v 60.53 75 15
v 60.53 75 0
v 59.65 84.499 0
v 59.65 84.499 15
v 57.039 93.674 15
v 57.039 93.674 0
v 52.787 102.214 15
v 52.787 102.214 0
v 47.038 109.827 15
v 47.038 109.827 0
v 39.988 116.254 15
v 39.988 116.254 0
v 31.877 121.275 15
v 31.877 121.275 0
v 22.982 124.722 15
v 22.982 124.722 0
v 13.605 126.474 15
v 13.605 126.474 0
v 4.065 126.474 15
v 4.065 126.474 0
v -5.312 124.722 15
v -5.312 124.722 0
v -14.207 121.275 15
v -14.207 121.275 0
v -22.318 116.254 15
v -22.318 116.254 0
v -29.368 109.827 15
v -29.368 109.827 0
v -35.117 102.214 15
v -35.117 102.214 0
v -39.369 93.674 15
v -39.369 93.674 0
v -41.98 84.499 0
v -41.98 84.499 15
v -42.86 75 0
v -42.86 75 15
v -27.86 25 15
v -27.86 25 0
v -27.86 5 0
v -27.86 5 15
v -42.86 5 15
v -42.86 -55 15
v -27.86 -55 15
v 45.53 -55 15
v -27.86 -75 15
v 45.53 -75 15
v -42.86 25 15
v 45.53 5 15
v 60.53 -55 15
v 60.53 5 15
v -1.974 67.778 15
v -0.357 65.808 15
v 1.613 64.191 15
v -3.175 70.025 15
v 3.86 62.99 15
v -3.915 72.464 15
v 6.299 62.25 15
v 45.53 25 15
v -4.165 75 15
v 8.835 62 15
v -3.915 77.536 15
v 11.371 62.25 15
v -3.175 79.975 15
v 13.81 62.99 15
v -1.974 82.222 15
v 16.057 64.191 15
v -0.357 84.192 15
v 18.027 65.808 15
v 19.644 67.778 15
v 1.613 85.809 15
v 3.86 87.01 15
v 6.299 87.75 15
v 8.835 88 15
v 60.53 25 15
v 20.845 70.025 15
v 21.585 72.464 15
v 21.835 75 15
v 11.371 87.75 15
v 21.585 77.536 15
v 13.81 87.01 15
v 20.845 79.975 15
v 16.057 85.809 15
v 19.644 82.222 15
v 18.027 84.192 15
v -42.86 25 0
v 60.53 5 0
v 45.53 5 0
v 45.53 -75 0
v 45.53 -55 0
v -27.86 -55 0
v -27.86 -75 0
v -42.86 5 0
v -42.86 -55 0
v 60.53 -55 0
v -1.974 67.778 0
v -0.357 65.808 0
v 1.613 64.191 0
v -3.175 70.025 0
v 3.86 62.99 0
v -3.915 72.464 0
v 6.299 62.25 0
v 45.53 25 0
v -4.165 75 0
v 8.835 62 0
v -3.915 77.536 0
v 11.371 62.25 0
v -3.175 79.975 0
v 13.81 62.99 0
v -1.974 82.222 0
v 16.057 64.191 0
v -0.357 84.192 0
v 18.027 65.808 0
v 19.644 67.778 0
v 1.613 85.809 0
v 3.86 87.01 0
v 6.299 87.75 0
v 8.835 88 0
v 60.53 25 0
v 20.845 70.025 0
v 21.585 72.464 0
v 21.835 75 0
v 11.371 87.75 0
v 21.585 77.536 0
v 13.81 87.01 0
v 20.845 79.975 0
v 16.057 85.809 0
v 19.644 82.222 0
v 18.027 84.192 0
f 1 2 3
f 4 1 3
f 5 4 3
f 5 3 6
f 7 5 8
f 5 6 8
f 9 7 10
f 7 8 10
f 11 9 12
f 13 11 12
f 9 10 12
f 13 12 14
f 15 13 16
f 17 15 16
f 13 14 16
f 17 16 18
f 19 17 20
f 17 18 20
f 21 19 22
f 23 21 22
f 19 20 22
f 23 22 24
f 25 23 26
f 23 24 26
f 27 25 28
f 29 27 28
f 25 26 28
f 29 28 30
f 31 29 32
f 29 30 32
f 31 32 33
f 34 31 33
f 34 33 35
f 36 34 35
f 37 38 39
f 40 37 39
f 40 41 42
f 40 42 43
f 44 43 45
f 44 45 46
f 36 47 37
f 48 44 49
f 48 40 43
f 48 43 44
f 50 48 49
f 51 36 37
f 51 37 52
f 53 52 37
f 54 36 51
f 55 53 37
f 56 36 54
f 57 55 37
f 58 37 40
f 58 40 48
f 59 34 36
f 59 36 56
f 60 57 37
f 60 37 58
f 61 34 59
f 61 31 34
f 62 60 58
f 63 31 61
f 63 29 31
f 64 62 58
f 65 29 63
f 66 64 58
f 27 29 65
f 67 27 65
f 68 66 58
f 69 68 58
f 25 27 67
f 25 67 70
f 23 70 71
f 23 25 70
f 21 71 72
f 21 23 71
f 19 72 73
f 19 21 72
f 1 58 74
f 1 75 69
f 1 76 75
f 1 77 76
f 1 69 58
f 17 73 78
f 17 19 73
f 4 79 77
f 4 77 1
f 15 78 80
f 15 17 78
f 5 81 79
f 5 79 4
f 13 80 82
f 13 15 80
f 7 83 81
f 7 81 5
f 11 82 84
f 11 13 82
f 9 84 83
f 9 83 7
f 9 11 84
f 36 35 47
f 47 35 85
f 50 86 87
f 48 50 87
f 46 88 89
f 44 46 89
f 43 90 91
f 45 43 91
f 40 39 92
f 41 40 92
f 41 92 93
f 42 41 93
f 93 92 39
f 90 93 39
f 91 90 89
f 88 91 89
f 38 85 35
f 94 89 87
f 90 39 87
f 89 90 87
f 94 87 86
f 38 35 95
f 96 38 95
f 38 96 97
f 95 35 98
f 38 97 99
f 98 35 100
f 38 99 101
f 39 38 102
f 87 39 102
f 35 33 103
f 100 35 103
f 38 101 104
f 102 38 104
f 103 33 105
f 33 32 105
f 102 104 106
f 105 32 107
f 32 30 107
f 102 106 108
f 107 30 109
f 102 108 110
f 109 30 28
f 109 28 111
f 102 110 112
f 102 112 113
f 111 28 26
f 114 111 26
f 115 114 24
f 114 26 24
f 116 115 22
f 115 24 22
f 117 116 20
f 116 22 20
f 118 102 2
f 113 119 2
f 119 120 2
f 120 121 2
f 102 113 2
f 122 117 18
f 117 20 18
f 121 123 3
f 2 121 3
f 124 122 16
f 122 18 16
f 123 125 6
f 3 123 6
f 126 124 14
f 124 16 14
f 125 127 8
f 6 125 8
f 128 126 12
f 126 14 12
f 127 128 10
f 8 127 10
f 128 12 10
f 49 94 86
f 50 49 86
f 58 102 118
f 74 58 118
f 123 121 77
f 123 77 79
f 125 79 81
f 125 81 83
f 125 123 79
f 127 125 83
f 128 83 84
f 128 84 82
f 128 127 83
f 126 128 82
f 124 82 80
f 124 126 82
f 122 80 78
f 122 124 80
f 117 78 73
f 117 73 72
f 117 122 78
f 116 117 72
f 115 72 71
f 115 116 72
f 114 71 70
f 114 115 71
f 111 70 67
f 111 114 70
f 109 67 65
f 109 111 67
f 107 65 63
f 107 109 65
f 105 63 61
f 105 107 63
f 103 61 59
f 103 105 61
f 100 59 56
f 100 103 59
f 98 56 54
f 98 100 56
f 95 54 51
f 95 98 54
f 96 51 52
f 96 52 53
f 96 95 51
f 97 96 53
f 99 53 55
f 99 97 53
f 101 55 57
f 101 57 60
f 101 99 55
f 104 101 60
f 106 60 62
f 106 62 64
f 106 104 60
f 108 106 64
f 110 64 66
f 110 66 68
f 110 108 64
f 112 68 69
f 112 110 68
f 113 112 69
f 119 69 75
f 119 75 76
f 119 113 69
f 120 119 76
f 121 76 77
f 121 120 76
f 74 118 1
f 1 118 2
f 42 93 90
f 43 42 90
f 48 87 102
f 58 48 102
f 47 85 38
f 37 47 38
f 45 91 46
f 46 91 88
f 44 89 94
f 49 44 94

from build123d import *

# Parameters (mm, degrees)
ESQUISSE1_R        = 13
BOSS_EXTRU_1_DEPTH = 15


with BuildPart() as part:
    # Esquisse1 → Boss.-Extru.1 (new body)
    with BuildSketch(Plane.XY):
        with BuildLine():
            Line((-27.86, -55), (-27.86, -75))
            Line((-27.86, -75), (45.53, -75))
            Line((45.53, -75), (45.53, -55))
            Line((45.53, -55), (60.53, -55))
            Line((60.53, -55), (60.53, 5))
            Line((60.53, 5), (45.53, 5))
            Line((45.53, 5), (45.53, 25))
            Line((45.53, 25), (60.53, 25))
            Line((60.53, 25), (60.53, 75))
            ThreePointArc((60.53, 75), (8.835, 126.695), (-42.86, 75))
            Line((-42.86, 75), (-42.86, 25))
            Line((-42.86, 25), (-27.86, 25))
            Line((-27.86, 25), (-27.86, 5))
            Line((-27.86, 5), (-42.86, 5))
            Line((-42.86, 5), (-42.86, -55))
            Line((-42.86, -55), (-27.86, -55))
        make_face()
        with Locations((8.835, 75)):
            Circle(ESQUISSE1_R, mode=Mode.SUBTRACT)
    extrude(amount=BOSS_EXTRU_1_DEPTH)


solid = part.part
